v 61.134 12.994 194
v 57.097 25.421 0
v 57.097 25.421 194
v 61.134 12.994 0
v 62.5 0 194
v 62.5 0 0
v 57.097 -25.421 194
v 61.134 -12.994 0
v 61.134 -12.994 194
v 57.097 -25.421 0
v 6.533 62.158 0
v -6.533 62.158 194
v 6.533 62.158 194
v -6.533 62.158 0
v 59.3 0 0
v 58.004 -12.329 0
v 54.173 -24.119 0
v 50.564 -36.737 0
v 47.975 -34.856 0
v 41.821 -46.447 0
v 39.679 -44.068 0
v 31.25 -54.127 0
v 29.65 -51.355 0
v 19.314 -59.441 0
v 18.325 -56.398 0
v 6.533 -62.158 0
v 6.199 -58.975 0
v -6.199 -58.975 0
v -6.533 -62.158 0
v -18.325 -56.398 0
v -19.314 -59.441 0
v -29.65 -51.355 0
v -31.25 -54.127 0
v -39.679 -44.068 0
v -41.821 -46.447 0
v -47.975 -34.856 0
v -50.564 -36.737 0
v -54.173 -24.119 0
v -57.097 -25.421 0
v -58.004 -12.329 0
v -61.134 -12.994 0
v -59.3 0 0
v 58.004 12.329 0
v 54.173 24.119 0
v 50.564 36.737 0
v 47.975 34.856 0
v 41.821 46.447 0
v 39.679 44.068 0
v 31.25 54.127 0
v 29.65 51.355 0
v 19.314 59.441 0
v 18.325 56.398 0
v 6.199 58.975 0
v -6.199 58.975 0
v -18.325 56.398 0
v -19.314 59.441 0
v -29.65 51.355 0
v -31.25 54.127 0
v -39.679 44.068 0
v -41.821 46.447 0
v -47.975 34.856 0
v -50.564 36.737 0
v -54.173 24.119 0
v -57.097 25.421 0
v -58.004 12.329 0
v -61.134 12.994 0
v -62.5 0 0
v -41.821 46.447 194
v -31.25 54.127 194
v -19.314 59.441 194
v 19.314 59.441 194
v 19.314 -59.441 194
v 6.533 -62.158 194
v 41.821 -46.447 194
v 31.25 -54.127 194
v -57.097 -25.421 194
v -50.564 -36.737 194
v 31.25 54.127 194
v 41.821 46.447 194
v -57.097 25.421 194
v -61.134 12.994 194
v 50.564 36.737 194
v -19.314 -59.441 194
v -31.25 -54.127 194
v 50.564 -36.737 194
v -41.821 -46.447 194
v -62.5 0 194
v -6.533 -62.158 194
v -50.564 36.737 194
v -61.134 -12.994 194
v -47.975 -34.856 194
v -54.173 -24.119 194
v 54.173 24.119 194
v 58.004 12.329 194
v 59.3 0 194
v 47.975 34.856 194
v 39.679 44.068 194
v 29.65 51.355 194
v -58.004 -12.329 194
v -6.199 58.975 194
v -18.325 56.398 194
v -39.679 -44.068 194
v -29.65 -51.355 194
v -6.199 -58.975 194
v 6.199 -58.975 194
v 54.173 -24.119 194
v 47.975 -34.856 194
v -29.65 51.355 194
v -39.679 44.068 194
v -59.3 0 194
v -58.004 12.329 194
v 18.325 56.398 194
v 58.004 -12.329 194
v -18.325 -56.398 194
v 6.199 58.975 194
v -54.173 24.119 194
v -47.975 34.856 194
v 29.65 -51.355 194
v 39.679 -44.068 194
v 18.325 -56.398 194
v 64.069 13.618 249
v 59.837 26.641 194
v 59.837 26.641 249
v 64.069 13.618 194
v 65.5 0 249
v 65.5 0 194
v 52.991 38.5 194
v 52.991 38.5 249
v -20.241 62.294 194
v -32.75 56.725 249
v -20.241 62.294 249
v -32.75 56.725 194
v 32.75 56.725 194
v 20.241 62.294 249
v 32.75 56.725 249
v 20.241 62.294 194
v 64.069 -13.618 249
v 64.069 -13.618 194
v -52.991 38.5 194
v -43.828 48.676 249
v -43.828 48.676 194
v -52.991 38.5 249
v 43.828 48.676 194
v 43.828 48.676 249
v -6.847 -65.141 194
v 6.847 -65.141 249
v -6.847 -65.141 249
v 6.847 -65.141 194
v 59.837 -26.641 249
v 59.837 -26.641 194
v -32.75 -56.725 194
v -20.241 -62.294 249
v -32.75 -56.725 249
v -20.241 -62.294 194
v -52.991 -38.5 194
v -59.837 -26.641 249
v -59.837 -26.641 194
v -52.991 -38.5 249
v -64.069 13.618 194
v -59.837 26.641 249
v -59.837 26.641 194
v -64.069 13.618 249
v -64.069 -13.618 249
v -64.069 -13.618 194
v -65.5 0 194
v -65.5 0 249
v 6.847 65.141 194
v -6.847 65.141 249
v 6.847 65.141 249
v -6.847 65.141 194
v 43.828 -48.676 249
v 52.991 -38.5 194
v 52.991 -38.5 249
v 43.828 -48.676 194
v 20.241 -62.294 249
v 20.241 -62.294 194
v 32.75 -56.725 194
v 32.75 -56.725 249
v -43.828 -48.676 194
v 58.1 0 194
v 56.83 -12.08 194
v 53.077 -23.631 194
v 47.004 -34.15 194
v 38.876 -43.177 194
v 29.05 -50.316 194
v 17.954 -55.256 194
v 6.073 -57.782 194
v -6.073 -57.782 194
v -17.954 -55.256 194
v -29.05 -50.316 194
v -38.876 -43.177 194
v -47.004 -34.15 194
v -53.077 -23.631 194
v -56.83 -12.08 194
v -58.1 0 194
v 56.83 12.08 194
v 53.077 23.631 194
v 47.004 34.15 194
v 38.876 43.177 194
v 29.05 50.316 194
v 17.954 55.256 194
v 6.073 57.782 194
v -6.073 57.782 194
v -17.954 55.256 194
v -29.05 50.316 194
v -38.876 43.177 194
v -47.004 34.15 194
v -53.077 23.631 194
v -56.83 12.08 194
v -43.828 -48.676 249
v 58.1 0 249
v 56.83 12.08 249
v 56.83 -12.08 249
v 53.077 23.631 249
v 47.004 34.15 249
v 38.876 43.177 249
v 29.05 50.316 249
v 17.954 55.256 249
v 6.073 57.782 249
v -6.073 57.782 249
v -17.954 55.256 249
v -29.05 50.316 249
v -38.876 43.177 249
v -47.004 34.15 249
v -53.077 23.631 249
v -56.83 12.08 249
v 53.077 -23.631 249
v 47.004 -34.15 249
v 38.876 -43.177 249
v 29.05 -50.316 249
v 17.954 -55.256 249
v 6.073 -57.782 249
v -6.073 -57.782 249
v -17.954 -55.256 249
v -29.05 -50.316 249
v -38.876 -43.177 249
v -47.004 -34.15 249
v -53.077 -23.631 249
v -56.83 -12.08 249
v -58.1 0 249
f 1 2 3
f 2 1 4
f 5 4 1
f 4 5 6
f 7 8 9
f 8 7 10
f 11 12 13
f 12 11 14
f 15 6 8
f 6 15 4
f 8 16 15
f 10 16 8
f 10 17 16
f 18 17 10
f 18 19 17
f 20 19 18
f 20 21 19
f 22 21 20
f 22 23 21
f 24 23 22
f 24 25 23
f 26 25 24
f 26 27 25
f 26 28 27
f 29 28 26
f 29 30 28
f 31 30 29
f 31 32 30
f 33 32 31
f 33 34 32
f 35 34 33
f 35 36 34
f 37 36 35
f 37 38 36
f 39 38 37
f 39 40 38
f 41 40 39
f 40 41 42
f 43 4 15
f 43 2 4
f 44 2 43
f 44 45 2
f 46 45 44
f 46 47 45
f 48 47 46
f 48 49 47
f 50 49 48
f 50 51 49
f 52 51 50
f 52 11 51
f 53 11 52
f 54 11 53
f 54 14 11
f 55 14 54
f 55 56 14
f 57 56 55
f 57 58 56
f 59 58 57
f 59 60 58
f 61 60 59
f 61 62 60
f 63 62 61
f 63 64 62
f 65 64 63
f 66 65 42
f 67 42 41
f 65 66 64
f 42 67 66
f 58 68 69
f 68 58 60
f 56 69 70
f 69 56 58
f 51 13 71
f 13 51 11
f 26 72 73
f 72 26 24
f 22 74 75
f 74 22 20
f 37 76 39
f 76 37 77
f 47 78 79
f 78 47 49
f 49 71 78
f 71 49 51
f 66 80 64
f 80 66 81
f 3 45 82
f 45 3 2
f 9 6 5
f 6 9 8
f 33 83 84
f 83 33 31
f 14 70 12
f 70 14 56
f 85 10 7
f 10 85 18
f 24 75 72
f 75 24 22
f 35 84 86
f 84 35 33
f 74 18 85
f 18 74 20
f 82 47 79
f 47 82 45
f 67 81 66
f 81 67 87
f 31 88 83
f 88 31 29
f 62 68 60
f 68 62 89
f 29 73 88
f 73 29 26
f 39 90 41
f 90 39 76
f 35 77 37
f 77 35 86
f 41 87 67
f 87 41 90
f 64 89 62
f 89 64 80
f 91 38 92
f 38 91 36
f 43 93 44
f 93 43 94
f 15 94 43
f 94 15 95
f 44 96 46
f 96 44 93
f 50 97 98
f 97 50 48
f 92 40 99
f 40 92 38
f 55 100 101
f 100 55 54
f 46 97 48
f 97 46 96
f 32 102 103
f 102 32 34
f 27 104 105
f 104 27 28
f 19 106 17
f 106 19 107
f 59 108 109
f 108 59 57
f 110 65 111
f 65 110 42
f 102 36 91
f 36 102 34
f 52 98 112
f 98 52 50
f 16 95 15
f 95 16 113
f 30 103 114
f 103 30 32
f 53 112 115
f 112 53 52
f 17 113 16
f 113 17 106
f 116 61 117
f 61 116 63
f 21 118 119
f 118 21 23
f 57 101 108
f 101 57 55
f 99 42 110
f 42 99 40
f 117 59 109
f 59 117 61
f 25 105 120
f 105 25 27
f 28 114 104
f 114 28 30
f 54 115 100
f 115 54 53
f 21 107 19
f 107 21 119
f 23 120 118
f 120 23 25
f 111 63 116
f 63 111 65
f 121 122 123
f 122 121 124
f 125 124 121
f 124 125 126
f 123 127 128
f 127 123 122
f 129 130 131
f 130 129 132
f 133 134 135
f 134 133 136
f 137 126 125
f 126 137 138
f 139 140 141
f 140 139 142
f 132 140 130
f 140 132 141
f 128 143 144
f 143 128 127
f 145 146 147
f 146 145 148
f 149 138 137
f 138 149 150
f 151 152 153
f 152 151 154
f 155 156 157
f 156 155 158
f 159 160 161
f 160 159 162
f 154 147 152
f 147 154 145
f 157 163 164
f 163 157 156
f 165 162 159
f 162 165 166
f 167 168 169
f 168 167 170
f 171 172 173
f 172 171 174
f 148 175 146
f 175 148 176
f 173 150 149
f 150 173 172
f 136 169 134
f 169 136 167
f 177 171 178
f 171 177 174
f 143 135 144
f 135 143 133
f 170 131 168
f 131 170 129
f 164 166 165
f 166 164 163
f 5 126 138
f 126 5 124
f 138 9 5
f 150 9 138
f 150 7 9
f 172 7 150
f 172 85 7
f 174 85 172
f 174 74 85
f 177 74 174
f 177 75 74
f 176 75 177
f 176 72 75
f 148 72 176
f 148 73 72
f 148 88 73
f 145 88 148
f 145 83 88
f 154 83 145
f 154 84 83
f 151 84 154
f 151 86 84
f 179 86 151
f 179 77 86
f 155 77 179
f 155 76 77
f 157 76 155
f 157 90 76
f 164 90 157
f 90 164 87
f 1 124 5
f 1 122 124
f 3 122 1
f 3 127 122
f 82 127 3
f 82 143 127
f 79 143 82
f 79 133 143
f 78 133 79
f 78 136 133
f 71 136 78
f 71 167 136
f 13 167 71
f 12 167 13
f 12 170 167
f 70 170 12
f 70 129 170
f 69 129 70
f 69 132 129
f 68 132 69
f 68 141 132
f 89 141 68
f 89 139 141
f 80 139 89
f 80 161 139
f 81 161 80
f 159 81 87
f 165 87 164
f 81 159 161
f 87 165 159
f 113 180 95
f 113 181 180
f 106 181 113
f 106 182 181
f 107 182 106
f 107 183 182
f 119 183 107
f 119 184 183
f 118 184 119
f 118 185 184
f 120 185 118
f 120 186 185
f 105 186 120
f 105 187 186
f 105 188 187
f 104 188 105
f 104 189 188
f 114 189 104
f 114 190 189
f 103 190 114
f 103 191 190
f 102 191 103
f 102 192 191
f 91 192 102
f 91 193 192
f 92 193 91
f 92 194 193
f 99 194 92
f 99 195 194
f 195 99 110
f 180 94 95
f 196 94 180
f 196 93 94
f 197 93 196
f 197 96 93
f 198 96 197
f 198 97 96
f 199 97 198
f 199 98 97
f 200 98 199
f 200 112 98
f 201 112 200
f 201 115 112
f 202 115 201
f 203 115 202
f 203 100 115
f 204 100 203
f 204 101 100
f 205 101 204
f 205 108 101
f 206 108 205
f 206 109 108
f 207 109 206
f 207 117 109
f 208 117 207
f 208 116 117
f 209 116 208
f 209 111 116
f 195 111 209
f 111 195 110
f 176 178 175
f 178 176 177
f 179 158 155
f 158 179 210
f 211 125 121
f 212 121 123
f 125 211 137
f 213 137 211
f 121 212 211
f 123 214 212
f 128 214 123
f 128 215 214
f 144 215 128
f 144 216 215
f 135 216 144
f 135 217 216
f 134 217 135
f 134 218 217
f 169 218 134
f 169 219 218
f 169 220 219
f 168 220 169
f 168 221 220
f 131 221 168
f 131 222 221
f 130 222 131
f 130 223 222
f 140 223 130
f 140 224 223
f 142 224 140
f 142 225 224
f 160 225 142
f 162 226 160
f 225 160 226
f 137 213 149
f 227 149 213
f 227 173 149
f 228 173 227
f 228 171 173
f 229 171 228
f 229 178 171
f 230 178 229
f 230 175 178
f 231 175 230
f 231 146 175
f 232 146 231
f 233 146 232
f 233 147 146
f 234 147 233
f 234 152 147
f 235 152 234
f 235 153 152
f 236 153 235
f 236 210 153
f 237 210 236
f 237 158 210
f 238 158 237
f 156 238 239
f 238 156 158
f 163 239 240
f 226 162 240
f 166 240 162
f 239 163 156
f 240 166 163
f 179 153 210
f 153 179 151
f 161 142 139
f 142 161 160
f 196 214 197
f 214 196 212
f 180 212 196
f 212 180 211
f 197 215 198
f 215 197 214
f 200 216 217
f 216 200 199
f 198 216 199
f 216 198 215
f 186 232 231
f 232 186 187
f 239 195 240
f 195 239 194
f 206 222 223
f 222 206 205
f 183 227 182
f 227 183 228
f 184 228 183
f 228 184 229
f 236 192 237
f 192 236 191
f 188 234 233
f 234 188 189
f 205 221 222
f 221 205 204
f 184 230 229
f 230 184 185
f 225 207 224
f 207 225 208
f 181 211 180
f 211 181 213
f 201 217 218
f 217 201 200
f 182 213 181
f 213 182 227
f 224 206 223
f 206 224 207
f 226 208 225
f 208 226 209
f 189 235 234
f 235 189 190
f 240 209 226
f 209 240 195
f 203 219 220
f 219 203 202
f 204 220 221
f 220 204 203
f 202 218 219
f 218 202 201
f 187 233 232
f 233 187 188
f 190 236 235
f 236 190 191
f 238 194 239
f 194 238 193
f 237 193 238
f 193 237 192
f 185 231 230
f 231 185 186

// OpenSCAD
// Parameters
pipe_standard = 1; //[1:1:1]
nominal_diameter = 125; //[63:250:1]
length_mm = 250; //[125:500:1]
center = 0; //[0:1:1]
end_style = 1; //[1:1:1]
pipe_od = 125; //[63:250:1]
pipe_wall = 3.2; //[1.6:6.4:0.1]
fit_len = 55; //[30:110:1]
fit_od_extra = 6; //[3:12:0.5]
fit_wall_extra = 1.2; //[0.5:3:0.1]
stop_ring_len = 6; //[3:15:0.5]
stop_ring_radial = 2; //[1:5:0.5]
overlap = 1; //[0.5:2:0.1]
pipe_body_len = 195; //[60:450:1]

// HT Pipe - complete geometry
module ht_pipe() {
  color([0.85, 0.85, 0.8]) {
    // Outer pipe body
    difference() {
      cylinder(r=pipe_od/2, h=pipe_body_len, center=false);
      // Inner pipe void
      translate([0, 0, -overlap/2])
        cylinder(r=pipe_od/2 - pipe_wall, h=pipe_body_len + overlap, center=false);
    }
    
    // Integrated end fitting
    translate([0, 0, pipe_body_len - overlap]) {
      difference() {
        // Outer fitting
        cylinder(r=pipe_od/2 + fit_od_extra/2, h=fit_len, center=false);
        // Inner fitting void
        translate([0, 0, -overlap/2])
          cylinder(r=pipe_od/2 - pipe_wall - fit_wall_extra, h=fit_len + overlap, center=false);
        // Stop ring void
        translate([0, 0, fit_len - stop_ring_len - overlap/2])
          cylinder(r=pipe_od/2 - pipe_wall - fit_wall_extra - stop_ring_radial, h=stop_ring_len + overlap, center=false);
      }
    }
  }
}

// Assembly
module assembly() {
  ht_pipe();
}

assembly();
